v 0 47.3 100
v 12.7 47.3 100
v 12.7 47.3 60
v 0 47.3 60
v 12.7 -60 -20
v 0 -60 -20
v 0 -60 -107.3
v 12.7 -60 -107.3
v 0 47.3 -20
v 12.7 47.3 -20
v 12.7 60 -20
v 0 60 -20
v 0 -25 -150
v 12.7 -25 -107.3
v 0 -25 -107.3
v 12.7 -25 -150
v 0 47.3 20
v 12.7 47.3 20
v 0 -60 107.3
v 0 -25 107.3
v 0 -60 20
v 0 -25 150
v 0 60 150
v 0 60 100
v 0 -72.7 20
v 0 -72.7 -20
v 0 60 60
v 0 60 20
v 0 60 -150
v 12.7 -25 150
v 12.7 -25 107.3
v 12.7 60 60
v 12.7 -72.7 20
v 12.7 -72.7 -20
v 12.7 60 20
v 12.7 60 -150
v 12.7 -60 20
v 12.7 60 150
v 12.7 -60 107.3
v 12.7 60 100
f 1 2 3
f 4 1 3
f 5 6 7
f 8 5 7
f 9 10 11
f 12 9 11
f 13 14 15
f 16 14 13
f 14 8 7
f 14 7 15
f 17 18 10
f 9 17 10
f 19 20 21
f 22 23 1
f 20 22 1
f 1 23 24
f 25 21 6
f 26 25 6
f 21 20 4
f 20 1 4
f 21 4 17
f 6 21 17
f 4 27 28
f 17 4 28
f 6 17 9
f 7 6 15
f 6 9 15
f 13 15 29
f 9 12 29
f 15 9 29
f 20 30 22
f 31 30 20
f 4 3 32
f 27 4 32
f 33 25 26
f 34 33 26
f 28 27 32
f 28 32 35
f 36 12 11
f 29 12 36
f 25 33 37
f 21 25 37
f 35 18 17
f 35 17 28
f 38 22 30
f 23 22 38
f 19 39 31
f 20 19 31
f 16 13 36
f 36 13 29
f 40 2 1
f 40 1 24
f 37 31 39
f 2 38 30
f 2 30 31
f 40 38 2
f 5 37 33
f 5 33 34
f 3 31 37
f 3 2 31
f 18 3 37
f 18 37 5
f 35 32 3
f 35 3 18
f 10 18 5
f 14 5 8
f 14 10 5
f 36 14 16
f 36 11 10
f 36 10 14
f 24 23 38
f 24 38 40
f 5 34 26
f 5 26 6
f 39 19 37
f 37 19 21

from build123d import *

# Parameters (mm, degrees)
SKETCH1_W           = 300
SKETCH1_H           = 120
SKETCH1_W_2         = 40
SKETCH1_H_2         = 12.7
BOSS_EXTRUDE1_DEPTH = 12.7
SKETCH2_W           = 42.7
SKETCH2_H           = 35
CUT_EXTRUDE1_DEPTH  = 12.7
SKETCH3_W           = 40
SKETCH3_H           = 12.7
CUT_EXTRUDE2_DEPTH  = 12.7
SKETCH4_W           = 40
SKETCH4_H           = 12.7
CUT_EXTRUDE3_DEPTH  = 12.7


with BuildPart() as part:
    # Sketch1 → Boss-Extrude1 (new body)
    with BuildSketch(Plane(origin=(0, 0, 0), x_dir=(0, 0, -1), z_dir=(1, 0, 0))):
        Rectangle(SKETCH1_W, SKETCH1_H)
        with Locations((0, -66.35)):
            Rectangle(SKETCH1_W_2, SKETCH1_H_2)
    extrude(amount=BOSS_EXTRUDE1_DEPTH)

    # Sketch2 → Cut-Extrude1 (cut)
    with BuildSketch(Plane(origin=(12.7, 0, 0), x_dir=(0, 0, -1), z_dir=(1, 0, 0))):
        with Locations((-128.65, -42.5)):
            Rectangle(SKETCH2_W, SKETCH2_H)
        with Locations((128.65, -42.5)):
            Rectangle(SKETCH2_W, SKETCH2_H)
    extrude(amount=-CUT_EXTRUDE1_DEPTH, mode=Mode.SUBTRACT)

    # Sketch3 → Cut-Extrude2 (cut)
    with BuildSketch(Plane(origin=(12.7, 0, 0), x_dir=(0, 0, -1), z_dir=(1, 0, 0))):
        with Locations((0, 53.65)):
            Rectangle(SKETCH3_W, SKETCH3_H)
    extrude(amount=-CUT_EXTRUDE2_DEPTH, mode=Mode.SUBTRACT)

    # Sketch4 → Cut-Extrude3 (cut)
    with BuildSketch(Plane(origin=(12.7, 0, 0), x_dir=(0, 0, -1), z_dir=(1, 0, 0))):
        with Locations((-80, 53.65)):
            Rectangle(SKETCH4_W, SKETCH4_H)
    extrude(amount=-CUT_EXTRUDE3_DEPTH, mode=Mode.SUBTRACT)


solid = part.part
